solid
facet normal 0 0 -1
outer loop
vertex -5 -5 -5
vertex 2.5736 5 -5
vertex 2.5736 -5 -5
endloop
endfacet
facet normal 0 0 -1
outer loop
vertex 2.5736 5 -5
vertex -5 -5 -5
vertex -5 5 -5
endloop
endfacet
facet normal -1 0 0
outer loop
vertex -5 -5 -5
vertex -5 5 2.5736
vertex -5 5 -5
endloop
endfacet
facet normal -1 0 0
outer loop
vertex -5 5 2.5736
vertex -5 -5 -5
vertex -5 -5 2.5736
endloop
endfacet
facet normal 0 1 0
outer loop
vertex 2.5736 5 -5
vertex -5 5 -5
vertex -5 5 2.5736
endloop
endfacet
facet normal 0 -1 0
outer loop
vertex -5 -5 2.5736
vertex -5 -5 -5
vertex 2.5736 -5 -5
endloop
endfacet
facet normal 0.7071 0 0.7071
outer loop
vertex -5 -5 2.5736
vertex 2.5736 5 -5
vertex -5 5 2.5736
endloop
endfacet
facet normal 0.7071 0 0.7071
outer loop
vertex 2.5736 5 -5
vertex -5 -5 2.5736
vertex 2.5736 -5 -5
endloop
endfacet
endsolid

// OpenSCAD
difference(){

cube(size=[10, 10, 10], center=true);

translate([20, 0, 20]) {
rotate([0, 45, 0])
cube(size=[20, 20, 60], center=true);
}


}
